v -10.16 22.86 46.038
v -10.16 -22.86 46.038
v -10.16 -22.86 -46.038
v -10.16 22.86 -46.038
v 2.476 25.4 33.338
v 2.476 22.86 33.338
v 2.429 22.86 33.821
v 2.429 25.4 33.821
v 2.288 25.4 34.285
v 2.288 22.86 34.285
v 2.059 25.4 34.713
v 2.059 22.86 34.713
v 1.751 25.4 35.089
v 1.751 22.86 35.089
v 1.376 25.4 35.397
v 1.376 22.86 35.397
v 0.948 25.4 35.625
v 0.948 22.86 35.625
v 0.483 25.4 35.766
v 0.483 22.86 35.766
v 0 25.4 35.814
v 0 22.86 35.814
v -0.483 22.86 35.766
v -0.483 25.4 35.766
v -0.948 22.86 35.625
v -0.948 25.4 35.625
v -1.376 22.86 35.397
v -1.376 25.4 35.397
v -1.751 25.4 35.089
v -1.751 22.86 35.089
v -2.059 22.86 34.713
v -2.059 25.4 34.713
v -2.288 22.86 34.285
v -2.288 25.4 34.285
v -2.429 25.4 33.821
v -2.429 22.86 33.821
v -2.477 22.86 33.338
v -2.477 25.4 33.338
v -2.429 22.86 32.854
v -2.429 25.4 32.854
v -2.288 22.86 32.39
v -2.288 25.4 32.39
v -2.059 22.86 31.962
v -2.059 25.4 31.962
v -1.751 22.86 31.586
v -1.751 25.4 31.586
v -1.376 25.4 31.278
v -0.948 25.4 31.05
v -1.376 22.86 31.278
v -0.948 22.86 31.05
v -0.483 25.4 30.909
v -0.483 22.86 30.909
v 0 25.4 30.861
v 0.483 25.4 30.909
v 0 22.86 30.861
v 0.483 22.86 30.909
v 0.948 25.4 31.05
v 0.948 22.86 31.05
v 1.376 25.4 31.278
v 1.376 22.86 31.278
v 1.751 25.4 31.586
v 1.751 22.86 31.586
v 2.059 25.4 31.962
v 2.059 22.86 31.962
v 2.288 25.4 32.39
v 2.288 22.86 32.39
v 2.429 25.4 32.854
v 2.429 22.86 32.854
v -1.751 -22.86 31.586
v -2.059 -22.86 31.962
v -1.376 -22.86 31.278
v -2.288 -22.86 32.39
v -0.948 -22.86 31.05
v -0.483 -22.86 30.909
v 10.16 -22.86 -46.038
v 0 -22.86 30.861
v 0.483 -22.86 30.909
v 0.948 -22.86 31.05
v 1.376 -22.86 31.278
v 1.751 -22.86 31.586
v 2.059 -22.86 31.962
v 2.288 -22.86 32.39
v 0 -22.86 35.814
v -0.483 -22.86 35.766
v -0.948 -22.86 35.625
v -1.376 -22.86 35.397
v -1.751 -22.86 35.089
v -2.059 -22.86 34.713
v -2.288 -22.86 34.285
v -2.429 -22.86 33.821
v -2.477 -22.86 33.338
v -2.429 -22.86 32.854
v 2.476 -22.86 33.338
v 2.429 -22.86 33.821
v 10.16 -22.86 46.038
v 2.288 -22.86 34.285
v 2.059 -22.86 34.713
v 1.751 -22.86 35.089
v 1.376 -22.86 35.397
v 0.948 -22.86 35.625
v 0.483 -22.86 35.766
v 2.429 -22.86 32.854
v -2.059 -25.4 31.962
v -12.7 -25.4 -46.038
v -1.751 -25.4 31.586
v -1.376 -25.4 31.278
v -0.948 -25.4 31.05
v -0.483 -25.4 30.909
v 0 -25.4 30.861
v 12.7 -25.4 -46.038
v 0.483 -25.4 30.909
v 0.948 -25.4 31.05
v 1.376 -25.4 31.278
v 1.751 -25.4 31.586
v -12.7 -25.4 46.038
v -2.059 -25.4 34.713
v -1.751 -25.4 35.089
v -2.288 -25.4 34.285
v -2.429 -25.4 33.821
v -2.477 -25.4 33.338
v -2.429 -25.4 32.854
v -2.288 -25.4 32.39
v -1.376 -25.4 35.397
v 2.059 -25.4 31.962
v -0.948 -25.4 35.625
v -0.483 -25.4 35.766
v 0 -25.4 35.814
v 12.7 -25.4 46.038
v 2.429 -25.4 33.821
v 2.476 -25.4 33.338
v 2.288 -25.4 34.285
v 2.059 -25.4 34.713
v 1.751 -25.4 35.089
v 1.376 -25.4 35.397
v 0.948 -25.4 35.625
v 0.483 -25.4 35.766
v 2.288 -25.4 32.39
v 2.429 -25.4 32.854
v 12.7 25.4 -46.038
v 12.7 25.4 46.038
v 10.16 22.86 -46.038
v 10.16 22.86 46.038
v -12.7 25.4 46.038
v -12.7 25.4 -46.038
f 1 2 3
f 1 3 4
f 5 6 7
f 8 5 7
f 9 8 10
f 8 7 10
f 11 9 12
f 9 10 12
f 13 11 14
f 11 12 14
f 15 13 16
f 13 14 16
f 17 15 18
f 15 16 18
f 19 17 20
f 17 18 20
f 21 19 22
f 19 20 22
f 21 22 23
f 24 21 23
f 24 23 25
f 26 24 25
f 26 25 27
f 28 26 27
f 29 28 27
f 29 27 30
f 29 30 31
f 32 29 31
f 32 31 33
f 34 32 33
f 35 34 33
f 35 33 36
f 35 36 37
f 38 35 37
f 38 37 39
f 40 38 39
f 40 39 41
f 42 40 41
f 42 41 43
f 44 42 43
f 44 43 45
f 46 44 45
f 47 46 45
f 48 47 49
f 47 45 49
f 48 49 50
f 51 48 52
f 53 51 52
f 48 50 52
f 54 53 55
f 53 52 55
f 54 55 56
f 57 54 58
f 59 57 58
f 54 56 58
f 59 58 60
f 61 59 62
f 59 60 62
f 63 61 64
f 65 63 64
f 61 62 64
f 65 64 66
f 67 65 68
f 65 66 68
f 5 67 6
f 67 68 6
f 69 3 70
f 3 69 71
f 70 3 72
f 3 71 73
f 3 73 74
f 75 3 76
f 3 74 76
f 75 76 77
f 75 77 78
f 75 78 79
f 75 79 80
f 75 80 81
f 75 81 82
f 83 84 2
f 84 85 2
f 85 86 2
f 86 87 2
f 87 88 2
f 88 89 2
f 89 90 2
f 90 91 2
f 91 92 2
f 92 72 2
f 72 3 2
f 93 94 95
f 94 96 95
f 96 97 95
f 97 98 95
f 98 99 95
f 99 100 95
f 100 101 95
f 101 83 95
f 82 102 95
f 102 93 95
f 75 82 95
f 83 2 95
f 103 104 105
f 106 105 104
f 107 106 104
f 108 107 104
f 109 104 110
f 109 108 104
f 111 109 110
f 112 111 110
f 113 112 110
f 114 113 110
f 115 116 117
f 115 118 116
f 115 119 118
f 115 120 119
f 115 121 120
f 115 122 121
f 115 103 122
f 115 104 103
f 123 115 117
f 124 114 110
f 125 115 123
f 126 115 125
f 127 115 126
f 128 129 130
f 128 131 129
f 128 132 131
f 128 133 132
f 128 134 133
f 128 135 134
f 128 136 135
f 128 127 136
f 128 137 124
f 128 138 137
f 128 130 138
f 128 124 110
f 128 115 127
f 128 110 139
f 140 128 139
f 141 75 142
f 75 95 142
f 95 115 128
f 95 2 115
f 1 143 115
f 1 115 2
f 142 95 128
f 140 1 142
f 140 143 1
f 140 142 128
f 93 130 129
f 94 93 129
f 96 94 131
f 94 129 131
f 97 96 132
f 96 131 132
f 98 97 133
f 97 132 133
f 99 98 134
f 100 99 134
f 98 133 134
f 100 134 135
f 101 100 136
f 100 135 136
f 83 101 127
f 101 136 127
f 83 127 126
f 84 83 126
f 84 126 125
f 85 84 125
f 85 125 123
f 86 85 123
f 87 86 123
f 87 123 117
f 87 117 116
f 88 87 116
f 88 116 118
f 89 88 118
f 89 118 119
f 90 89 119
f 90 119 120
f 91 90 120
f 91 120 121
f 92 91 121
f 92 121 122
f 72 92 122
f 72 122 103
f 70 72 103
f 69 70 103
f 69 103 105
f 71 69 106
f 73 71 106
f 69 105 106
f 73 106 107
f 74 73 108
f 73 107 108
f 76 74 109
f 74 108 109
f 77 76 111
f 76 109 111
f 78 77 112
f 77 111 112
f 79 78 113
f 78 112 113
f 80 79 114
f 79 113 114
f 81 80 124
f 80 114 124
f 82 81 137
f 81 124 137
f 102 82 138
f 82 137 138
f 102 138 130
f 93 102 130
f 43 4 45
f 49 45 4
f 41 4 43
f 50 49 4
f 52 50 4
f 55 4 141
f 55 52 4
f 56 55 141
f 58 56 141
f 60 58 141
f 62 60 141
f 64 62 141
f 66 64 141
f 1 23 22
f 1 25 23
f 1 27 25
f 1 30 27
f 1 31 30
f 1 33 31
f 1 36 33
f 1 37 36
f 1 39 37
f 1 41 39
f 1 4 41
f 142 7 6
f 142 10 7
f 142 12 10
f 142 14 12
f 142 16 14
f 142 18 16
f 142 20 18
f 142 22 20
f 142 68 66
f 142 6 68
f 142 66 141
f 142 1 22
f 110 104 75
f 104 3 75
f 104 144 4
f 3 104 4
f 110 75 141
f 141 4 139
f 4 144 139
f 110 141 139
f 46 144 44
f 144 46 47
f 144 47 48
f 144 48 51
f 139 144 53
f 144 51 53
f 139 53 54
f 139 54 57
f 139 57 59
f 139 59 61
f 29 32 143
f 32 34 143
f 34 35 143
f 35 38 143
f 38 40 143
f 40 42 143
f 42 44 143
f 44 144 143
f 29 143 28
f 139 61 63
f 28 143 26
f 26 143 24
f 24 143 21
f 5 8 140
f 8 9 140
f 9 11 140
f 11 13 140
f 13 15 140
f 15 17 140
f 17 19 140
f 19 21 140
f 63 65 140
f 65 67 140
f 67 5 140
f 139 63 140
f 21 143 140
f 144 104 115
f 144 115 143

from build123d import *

# Parameters (mm, degrees)
SKETCH1_W           = 25.4
SKETCH1_H           = 50.8
SKETCH1_W_2         = 20.32
SKETCH1_H_2         = 45.72
EXTRUDE_THIN1_DEPTH = 46.0375
SKETCH2_R           = 2.4765
CUT_EXTRUDE1_DEPTH  = 51.8


with BuildPart() as part:
    # Sketch1 → Extrude-Thin1 (new body, symmetric)
    with BuildSketch(Plane.XY):
        Rectangle(SKETCH1_W, SKETCH1_H)
        Rectangle(SKETCH1_W_2, SKETCH1_H_2, mode=Mode.SUBTRACT)
    extrude(amount=EXTRUDE_THIN1_DEPTH, both=True)

    # Sketch2 → Cut-Extrude1 (cut, through all)
    with BuildSketch(Plane.XZ.offset(25.4)):
        with Locations((-5.11e-06, 33.3375)):
            Circle(SKETCH2_R)
    extrude(amount=-CUT_EXTRUDE1_DEPTH, mode=Mode.SUBTRACT)


solid = part.part
